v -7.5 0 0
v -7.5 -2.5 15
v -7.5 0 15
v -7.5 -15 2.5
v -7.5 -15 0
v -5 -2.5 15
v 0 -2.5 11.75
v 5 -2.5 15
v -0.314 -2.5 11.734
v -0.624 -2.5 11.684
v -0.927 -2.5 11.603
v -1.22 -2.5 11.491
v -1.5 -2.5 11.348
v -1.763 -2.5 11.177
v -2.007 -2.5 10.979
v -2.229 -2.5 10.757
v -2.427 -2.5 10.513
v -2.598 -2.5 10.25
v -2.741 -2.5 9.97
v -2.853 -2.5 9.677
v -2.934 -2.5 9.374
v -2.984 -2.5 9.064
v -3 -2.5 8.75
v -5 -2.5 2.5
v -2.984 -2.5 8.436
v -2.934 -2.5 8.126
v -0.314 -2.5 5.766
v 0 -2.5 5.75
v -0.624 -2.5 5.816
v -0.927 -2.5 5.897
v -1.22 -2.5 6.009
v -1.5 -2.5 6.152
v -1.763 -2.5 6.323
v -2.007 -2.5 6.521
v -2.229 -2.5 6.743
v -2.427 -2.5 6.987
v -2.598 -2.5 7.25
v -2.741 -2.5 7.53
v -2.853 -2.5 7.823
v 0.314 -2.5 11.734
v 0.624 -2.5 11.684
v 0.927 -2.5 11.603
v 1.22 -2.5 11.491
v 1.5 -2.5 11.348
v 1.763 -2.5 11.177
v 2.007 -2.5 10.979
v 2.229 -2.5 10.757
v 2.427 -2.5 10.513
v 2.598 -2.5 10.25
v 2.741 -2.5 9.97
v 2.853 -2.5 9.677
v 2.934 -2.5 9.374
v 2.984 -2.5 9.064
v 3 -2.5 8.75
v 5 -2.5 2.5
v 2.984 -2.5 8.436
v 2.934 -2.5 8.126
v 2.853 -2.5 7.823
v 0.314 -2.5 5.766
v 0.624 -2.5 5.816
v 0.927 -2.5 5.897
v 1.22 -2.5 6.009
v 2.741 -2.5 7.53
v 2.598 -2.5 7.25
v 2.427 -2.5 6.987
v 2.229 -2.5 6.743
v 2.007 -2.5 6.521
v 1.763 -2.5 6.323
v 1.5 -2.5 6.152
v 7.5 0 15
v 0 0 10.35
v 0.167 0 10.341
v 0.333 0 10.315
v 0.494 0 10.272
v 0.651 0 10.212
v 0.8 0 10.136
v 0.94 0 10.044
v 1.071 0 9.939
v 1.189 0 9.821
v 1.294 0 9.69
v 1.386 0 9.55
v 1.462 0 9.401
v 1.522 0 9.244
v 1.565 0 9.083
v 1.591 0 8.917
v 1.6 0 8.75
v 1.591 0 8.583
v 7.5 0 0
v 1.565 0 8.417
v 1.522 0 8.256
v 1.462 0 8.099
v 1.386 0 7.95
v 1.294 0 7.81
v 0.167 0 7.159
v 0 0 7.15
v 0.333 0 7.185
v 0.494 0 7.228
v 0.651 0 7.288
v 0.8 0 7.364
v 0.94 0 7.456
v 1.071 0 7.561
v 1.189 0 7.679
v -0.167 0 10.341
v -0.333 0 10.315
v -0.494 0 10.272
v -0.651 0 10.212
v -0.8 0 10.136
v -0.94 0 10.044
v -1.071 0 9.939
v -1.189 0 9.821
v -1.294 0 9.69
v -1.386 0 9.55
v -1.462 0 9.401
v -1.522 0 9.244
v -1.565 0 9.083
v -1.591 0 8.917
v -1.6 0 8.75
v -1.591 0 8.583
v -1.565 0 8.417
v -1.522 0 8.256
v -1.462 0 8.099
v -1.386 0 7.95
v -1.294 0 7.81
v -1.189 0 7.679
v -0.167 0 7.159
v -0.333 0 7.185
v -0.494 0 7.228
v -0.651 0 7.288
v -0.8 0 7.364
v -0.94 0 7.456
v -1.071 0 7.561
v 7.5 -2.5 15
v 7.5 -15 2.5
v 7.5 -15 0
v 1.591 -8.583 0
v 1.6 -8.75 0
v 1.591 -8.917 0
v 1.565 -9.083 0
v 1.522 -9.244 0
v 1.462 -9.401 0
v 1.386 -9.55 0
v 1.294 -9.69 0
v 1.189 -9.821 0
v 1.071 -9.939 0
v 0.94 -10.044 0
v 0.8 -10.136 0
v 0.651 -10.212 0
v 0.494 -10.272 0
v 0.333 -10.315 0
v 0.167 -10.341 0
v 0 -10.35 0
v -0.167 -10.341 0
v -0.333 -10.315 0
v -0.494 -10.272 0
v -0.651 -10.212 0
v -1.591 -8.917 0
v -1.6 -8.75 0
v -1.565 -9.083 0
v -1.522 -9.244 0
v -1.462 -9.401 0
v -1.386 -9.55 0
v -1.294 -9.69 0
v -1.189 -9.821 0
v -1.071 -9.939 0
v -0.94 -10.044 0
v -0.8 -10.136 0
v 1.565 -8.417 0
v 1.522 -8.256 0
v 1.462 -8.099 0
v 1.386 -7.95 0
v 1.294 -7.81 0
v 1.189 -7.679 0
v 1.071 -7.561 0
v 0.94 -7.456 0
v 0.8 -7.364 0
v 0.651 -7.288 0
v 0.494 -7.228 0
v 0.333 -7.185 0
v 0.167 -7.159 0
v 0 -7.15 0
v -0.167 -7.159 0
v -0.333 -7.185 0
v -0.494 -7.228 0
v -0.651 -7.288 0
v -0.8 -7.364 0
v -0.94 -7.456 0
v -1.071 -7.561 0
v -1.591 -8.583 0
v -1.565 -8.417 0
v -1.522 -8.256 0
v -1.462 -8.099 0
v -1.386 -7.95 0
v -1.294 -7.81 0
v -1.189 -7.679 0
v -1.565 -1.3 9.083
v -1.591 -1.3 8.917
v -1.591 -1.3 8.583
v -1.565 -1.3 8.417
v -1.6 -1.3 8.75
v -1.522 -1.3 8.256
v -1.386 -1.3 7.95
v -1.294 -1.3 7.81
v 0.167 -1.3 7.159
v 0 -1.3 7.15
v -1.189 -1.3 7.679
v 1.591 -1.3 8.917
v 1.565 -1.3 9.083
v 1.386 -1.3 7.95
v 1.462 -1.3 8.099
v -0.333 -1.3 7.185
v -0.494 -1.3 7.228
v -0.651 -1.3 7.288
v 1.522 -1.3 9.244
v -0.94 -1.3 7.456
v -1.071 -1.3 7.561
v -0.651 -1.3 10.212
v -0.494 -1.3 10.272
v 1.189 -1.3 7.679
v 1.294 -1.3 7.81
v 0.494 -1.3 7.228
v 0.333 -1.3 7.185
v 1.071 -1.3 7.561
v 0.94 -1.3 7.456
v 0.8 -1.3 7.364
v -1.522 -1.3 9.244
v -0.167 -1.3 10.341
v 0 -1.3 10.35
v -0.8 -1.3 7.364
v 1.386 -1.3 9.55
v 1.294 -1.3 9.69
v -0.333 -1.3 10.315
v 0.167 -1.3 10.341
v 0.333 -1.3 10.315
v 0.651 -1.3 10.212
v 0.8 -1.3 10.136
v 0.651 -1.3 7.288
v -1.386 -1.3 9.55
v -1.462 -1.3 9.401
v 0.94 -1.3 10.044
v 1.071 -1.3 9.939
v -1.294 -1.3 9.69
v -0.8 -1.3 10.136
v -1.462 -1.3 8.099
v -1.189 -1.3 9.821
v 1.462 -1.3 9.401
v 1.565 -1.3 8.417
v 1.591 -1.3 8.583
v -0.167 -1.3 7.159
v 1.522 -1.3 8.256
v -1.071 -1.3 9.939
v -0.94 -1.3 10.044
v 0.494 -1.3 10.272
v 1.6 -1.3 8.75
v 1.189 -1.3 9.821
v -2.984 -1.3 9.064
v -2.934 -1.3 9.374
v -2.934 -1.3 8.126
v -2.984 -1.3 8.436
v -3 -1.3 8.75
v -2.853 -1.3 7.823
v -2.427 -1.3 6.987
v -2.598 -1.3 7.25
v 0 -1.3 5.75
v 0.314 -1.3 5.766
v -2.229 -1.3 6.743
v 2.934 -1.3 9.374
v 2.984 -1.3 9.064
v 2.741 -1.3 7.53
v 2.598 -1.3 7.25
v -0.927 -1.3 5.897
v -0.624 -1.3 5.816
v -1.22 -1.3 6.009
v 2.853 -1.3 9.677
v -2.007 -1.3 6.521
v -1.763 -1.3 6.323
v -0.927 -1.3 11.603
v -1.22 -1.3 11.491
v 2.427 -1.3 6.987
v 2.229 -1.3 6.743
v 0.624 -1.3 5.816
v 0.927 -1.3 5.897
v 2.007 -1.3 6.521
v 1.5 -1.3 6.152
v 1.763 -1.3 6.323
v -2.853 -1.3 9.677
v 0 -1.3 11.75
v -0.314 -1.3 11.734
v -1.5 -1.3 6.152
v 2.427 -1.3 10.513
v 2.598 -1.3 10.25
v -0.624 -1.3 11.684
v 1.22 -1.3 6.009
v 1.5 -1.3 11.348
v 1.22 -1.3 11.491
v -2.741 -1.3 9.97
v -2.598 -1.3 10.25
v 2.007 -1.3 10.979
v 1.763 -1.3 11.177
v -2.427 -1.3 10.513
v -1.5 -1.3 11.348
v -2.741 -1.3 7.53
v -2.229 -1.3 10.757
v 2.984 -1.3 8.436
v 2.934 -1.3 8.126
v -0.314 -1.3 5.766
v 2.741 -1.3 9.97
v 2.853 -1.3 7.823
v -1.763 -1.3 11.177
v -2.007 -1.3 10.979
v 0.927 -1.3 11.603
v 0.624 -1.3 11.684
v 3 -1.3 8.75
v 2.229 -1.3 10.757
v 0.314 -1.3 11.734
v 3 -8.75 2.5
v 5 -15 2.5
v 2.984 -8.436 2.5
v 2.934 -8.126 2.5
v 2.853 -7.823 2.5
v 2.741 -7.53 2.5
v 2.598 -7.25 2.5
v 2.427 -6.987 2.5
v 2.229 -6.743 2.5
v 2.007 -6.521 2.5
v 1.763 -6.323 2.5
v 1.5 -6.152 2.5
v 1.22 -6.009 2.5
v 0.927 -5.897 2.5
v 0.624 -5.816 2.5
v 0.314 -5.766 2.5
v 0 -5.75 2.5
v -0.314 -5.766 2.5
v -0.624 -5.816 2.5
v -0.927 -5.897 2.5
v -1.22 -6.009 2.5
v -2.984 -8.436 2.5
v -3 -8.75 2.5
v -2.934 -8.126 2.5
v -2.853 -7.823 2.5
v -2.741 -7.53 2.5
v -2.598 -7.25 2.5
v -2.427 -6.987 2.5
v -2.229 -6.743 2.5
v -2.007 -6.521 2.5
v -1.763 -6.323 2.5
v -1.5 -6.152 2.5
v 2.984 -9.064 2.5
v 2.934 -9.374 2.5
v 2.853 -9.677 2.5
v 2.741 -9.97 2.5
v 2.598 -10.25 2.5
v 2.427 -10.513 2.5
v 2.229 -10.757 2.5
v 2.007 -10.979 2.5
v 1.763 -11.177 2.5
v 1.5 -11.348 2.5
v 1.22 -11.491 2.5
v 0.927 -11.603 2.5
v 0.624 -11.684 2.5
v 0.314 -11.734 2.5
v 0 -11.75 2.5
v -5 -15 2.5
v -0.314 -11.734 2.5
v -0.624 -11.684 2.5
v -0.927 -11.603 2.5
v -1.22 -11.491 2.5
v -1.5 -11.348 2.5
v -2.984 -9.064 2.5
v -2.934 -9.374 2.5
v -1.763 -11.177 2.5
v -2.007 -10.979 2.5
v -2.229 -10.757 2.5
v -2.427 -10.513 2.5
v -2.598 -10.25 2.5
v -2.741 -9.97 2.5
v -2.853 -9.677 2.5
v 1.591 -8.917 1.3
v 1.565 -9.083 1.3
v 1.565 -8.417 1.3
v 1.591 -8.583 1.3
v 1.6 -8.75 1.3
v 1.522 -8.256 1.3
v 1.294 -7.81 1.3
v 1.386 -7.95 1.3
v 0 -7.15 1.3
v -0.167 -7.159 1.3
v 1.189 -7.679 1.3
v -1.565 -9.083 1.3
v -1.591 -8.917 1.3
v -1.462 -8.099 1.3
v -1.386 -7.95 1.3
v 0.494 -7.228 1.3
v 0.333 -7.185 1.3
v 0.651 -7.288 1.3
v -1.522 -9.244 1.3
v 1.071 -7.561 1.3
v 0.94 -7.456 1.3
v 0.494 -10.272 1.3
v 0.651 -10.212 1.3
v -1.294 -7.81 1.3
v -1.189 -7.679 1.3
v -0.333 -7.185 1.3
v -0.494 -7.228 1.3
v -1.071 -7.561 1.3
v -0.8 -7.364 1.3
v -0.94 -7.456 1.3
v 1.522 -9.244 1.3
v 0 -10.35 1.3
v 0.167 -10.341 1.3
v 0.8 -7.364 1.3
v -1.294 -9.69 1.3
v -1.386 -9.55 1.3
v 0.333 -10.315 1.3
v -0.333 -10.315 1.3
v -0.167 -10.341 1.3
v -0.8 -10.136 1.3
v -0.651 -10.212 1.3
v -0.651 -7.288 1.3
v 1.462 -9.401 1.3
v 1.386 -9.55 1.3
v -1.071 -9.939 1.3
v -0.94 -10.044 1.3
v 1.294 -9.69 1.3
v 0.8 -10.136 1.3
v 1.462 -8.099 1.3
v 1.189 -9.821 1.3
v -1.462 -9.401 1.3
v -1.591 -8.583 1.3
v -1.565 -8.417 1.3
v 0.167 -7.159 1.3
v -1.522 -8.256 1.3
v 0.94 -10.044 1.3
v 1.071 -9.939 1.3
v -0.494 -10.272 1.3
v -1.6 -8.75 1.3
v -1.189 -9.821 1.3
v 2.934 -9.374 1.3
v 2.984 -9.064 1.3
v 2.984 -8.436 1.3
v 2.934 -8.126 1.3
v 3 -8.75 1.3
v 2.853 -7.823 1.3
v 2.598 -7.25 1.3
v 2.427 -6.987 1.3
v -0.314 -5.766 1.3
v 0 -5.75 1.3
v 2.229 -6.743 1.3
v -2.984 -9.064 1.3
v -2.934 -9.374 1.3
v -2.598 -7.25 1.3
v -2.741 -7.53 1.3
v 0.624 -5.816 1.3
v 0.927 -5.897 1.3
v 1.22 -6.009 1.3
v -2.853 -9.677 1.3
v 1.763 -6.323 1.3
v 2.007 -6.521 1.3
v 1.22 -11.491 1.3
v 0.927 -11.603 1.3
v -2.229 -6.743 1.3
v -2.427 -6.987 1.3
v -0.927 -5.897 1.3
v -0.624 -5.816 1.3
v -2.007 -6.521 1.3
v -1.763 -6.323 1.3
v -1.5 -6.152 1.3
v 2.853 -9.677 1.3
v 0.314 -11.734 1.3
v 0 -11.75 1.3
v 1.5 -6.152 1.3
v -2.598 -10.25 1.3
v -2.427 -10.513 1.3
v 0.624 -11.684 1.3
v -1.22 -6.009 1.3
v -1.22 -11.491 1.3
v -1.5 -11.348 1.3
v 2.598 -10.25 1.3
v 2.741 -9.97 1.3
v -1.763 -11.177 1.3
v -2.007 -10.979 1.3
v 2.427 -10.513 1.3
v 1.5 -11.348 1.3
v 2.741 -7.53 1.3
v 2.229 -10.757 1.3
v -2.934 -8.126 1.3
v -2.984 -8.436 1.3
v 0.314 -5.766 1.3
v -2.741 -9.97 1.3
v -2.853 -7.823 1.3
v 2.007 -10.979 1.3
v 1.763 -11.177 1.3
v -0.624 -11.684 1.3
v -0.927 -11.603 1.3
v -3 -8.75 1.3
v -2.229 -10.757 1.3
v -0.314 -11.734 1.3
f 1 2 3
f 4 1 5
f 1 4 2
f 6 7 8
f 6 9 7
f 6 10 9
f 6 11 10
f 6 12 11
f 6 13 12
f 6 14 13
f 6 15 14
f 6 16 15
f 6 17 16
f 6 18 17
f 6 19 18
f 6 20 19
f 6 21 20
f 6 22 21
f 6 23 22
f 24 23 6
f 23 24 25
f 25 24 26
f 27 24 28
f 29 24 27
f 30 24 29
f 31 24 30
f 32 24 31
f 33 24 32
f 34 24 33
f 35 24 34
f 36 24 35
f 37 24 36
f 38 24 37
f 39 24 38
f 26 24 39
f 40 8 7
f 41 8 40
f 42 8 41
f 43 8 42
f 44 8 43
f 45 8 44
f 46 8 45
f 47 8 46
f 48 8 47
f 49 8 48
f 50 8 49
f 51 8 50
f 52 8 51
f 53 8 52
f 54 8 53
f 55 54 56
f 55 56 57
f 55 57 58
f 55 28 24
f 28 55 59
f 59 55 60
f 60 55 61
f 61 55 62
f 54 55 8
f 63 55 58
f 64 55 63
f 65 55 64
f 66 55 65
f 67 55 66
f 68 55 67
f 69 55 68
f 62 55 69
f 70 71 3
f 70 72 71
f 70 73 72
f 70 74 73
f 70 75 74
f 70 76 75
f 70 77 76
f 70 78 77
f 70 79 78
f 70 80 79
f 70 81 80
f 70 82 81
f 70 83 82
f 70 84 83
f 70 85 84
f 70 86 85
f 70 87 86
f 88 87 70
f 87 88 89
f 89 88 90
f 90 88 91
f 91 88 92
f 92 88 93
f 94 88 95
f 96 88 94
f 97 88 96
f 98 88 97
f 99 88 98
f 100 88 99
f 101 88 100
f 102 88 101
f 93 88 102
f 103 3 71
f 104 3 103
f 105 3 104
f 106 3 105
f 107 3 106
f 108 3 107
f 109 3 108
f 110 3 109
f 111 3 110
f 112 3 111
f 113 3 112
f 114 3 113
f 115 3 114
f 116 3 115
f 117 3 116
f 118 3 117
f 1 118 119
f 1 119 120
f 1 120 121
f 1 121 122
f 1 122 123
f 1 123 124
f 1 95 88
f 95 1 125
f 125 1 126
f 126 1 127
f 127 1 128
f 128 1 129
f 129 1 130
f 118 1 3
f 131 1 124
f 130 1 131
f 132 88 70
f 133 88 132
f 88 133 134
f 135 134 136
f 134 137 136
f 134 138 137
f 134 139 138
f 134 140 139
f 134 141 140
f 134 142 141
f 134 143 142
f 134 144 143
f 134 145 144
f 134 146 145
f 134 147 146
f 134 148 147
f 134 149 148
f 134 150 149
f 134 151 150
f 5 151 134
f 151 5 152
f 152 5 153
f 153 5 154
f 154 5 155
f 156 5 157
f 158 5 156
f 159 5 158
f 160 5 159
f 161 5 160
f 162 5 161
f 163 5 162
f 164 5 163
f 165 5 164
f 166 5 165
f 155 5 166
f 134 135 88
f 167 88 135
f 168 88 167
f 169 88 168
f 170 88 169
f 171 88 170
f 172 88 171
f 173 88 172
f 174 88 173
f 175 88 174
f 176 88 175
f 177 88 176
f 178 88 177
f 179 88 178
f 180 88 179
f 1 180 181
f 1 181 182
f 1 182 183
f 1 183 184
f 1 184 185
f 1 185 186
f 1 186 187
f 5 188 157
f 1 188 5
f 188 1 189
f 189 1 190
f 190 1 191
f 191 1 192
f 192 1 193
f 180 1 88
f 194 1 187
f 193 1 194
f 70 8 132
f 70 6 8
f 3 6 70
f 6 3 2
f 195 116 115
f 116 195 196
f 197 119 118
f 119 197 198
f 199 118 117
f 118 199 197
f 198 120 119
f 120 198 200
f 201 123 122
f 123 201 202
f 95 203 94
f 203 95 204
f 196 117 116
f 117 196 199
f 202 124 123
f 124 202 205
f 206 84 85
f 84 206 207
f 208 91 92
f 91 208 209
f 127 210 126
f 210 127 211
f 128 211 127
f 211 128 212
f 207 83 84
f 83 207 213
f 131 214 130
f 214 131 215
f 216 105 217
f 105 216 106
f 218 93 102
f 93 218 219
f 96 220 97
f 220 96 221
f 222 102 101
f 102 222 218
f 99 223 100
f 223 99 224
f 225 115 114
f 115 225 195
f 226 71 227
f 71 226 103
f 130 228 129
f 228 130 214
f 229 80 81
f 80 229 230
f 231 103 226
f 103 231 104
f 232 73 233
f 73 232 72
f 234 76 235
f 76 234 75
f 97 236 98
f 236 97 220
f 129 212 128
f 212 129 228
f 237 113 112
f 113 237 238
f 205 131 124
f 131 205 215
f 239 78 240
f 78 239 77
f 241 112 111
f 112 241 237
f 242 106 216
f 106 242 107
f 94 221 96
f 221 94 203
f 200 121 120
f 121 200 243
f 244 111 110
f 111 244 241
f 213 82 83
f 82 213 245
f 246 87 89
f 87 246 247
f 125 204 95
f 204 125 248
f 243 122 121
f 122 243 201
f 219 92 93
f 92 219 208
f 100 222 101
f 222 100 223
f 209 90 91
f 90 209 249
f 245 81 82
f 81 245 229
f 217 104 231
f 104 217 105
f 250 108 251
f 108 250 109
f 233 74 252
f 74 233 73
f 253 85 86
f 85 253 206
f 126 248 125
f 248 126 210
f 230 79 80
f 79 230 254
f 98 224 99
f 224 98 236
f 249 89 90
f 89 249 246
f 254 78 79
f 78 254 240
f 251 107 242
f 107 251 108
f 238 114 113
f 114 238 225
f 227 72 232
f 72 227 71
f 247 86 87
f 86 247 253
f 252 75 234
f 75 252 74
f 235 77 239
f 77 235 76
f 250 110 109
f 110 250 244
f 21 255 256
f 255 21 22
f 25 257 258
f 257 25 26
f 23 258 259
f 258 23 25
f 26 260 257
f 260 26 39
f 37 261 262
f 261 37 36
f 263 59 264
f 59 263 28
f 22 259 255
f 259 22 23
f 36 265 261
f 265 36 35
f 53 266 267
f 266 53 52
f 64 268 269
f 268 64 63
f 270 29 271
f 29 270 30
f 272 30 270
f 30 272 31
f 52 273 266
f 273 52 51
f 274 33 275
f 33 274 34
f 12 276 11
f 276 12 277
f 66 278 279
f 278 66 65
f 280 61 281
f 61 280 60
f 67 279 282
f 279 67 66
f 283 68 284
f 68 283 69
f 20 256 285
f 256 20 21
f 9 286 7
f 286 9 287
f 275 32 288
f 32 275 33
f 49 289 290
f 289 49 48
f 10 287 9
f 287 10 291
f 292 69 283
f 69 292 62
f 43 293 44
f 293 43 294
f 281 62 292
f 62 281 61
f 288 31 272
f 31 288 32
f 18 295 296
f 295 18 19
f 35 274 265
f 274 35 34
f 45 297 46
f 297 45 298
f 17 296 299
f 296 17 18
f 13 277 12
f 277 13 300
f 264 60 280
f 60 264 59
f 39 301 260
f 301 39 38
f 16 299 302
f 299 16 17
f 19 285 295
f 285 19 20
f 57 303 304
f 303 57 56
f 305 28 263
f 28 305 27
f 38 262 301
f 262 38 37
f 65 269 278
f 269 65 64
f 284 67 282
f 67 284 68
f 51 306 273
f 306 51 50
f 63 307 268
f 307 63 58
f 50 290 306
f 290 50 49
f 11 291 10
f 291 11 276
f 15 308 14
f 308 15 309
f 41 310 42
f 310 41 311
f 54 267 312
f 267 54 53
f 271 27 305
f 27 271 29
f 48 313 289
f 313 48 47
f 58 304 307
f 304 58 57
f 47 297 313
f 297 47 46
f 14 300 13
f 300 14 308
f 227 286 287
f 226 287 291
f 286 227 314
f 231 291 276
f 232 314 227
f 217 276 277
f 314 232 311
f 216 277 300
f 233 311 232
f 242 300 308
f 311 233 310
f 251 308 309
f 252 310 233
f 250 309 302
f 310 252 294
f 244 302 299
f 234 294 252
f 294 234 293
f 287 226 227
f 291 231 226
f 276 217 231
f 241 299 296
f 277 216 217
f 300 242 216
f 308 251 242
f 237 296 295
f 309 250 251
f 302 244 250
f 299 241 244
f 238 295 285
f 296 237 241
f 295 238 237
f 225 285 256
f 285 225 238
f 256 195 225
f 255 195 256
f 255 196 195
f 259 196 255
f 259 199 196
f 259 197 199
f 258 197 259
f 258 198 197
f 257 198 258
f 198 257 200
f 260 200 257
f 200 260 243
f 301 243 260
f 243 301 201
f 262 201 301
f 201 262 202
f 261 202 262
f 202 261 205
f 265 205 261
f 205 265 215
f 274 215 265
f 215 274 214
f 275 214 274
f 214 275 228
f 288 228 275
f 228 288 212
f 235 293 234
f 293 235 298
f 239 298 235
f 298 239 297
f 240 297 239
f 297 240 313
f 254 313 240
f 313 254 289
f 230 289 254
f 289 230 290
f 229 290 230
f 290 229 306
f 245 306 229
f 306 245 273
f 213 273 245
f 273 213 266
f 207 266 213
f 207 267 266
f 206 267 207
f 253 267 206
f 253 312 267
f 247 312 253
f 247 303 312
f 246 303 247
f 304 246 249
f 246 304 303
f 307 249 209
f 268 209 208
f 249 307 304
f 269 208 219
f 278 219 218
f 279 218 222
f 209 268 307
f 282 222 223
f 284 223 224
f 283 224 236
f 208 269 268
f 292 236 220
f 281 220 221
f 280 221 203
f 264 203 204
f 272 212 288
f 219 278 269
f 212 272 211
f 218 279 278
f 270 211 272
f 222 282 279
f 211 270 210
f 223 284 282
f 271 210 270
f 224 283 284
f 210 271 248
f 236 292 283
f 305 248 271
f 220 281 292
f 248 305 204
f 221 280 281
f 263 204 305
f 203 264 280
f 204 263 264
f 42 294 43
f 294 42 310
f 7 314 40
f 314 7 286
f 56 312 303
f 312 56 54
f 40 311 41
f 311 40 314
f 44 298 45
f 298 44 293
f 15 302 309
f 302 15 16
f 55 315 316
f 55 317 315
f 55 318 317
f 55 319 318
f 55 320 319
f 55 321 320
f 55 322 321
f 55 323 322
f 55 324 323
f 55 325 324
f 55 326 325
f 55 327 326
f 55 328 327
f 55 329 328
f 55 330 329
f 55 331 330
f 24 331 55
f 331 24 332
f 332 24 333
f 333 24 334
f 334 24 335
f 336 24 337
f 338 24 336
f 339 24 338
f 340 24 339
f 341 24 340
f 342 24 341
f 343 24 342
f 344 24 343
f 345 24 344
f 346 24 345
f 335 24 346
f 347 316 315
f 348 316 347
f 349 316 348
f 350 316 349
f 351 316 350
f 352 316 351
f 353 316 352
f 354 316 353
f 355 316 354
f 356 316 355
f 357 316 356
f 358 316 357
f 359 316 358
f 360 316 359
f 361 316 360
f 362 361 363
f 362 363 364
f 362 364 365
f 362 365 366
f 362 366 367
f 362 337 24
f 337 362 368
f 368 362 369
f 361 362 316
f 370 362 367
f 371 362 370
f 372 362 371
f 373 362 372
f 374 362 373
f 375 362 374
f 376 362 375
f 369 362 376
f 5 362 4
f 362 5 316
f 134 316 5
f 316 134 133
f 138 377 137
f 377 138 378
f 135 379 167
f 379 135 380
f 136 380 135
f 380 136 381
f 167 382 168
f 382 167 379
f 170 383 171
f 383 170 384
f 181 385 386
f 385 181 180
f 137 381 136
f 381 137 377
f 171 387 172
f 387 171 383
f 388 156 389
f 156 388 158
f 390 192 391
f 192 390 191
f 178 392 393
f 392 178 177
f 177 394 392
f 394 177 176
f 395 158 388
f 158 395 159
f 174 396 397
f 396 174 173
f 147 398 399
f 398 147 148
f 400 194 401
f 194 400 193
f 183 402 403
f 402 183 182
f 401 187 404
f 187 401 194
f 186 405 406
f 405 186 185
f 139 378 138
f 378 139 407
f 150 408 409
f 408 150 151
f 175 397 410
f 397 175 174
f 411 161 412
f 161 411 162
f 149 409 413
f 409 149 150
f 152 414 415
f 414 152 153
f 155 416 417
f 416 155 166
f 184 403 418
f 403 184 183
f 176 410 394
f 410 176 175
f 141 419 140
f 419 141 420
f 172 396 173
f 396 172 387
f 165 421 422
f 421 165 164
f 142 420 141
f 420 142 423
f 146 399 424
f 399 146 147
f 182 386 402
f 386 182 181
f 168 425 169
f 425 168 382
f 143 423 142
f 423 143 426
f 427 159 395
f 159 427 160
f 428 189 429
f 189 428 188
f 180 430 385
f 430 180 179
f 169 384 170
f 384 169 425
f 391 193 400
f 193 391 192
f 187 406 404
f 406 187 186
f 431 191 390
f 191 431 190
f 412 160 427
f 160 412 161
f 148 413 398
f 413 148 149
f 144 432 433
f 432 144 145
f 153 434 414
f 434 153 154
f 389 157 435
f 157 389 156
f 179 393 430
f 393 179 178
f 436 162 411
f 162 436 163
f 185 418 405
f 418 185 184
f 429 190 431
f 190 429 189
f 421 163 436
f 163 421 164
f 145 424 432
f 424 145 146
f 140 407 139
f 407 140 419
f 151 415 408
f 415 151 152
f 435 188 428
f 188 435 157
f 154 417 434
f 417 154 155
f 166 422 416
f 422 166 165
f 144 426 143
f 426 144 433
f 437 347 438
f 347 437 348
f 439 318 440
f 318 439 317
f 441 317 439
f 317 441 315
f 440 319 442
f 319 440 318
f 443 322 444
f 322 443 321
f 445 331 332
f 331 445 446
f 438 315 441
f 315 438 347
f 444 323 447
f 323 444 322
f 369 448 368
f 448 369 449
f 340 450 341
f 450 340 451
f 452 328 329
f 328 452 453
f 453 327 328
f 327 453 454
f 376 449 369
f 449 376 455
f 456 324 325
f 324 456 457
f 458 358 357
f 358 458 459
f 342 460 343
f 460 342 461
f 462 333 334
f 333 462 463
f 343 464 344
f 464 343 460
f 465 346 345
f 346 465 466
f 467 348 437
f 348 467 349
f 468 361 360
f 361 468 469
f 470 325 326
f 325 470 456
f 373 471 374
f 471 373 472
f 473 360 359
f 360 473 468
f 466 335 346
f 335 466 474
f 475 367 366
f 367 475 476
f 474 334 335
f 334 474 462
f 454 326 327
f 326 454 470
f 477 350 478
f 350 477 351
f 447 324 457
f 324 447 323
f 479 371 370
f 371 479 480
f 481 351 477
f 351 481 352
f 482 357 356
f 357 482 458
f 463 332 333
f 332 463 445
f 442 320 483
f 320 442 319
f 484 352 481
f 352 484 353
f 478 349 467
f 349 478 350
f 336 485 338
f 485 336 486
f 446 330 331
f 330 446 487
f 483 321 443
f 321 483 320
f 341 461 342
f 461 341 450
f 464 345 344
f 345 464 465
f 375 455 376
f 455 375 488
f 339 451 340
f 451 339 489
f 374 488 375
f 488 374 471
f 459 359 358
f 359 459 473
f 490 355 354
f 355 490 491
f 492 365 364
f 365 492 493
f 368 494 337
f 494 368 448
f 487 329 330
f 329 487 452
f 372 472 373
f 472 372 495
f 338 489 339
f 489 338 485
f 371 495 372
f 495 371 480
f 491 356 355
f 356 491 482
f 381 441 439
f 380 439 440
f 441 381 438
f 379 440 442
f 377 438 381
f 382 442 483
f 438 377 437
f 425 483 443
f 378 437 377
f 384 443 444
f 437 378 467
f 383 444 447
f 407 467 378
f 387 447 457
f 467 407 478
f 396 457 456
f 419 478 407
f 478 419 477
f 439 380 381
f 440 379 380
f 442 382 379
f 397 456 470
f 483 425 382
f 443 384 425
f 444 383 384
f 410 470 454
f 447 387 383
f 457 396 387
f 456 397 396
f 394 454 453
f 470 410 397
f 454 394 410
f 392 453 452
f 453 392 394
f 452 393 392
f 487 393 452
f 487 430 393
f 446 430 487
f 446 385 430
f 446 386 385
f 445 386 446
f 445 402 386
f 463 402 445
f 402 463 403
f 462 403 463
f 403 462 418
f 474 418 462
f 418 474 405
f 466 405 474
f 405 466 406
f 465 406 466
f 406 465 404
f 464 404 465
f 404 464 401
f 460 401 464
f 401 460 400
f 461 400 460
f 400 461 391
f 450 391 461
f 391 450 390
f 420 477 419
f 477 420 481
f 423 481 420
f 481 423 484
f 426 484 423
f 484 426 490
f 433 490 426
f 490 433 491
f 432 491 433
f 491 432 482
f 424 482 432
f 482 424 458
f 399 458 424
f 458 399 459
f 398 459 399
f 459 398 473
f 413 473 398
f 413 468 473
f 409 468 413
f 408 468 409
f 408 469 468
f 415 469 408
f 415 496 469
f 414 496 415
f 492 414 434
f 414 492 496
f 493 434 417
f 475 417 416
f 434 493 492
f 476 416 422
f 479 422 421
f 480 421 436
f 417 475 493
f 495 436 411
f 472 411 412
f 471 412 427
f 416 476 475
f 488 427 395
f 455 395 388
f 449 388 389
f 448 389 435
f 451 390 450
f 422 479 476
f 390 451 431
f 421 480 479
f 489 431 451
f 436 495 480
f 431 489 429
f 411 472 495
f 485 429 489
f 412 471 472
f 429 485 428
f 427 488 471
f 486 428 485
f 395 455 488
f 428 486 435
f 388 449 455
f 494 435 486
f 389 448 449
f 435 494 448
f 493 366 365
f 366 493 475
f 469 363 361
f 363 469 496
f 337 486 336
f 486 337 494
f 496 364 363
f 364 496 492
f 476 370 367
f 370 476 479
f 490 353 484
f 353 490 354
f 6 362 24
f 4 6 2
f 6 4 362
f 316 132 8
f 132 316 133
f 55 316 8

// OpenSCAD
$fn = 60;

m3_hole_d = 3.2;
m3_countersink_depth = 1.2;
m3_countersink_d = 6;

card_sep = 20.32;

makerbeam_w = 15;

plate_thickness = 2.5;

module plate() {
    translate([-makerbeam_w/2, -makerbeam_w/2, 0])
        cube([makerbeam_w, makerbeam_w, plate_thickness]);
}

module plate_with_screw_hole() {
    difference() {
        plate();
        translate([0, -plate_thickness/2, -2]) {
            cylinder(h=plate_thickness+4, d=m3_hole_d);
        }
        translate([0, -plate_thickness/2, plate_thickness-m3_countersink_depth]) {
            cylinder(h=plate_thickness, d=m3_countersink_d);
        }
    }
}

module angle_brace() {
    translate([plate_thickness, 0, 0]) {
        rotate([90, 0, 270]) {
            linear_extrude(plate_thickness) {
                polygon([[0,0], [makerbeam_w-plate_thickness, 0], [0, makerbeam_w-plate_thickness]]);
            }
        }
    }
}

module bracket() {
    translate([0, 0, makerbeam_w/2]) {
        rotate([90, 0, 0]) {
            rotate([0, 0, 180]) {
                plate_with_screw_hole();
            }
        }
    }
    translate([0, -makerbeam_w/2, 0]) {
        plate_with_screw_hole();
    }
    translate([-makerbeam_w/2, -plate_thickness, plate_thickness]) {
        angle_brace();
    }
    translate([makerbeam_w/2 - plate_thickness, -plate_thickness, plate_thickness]) {
        angle_brace();
    }
}

//plate_with_screw_hole();
//angle_brace();
bracket();
